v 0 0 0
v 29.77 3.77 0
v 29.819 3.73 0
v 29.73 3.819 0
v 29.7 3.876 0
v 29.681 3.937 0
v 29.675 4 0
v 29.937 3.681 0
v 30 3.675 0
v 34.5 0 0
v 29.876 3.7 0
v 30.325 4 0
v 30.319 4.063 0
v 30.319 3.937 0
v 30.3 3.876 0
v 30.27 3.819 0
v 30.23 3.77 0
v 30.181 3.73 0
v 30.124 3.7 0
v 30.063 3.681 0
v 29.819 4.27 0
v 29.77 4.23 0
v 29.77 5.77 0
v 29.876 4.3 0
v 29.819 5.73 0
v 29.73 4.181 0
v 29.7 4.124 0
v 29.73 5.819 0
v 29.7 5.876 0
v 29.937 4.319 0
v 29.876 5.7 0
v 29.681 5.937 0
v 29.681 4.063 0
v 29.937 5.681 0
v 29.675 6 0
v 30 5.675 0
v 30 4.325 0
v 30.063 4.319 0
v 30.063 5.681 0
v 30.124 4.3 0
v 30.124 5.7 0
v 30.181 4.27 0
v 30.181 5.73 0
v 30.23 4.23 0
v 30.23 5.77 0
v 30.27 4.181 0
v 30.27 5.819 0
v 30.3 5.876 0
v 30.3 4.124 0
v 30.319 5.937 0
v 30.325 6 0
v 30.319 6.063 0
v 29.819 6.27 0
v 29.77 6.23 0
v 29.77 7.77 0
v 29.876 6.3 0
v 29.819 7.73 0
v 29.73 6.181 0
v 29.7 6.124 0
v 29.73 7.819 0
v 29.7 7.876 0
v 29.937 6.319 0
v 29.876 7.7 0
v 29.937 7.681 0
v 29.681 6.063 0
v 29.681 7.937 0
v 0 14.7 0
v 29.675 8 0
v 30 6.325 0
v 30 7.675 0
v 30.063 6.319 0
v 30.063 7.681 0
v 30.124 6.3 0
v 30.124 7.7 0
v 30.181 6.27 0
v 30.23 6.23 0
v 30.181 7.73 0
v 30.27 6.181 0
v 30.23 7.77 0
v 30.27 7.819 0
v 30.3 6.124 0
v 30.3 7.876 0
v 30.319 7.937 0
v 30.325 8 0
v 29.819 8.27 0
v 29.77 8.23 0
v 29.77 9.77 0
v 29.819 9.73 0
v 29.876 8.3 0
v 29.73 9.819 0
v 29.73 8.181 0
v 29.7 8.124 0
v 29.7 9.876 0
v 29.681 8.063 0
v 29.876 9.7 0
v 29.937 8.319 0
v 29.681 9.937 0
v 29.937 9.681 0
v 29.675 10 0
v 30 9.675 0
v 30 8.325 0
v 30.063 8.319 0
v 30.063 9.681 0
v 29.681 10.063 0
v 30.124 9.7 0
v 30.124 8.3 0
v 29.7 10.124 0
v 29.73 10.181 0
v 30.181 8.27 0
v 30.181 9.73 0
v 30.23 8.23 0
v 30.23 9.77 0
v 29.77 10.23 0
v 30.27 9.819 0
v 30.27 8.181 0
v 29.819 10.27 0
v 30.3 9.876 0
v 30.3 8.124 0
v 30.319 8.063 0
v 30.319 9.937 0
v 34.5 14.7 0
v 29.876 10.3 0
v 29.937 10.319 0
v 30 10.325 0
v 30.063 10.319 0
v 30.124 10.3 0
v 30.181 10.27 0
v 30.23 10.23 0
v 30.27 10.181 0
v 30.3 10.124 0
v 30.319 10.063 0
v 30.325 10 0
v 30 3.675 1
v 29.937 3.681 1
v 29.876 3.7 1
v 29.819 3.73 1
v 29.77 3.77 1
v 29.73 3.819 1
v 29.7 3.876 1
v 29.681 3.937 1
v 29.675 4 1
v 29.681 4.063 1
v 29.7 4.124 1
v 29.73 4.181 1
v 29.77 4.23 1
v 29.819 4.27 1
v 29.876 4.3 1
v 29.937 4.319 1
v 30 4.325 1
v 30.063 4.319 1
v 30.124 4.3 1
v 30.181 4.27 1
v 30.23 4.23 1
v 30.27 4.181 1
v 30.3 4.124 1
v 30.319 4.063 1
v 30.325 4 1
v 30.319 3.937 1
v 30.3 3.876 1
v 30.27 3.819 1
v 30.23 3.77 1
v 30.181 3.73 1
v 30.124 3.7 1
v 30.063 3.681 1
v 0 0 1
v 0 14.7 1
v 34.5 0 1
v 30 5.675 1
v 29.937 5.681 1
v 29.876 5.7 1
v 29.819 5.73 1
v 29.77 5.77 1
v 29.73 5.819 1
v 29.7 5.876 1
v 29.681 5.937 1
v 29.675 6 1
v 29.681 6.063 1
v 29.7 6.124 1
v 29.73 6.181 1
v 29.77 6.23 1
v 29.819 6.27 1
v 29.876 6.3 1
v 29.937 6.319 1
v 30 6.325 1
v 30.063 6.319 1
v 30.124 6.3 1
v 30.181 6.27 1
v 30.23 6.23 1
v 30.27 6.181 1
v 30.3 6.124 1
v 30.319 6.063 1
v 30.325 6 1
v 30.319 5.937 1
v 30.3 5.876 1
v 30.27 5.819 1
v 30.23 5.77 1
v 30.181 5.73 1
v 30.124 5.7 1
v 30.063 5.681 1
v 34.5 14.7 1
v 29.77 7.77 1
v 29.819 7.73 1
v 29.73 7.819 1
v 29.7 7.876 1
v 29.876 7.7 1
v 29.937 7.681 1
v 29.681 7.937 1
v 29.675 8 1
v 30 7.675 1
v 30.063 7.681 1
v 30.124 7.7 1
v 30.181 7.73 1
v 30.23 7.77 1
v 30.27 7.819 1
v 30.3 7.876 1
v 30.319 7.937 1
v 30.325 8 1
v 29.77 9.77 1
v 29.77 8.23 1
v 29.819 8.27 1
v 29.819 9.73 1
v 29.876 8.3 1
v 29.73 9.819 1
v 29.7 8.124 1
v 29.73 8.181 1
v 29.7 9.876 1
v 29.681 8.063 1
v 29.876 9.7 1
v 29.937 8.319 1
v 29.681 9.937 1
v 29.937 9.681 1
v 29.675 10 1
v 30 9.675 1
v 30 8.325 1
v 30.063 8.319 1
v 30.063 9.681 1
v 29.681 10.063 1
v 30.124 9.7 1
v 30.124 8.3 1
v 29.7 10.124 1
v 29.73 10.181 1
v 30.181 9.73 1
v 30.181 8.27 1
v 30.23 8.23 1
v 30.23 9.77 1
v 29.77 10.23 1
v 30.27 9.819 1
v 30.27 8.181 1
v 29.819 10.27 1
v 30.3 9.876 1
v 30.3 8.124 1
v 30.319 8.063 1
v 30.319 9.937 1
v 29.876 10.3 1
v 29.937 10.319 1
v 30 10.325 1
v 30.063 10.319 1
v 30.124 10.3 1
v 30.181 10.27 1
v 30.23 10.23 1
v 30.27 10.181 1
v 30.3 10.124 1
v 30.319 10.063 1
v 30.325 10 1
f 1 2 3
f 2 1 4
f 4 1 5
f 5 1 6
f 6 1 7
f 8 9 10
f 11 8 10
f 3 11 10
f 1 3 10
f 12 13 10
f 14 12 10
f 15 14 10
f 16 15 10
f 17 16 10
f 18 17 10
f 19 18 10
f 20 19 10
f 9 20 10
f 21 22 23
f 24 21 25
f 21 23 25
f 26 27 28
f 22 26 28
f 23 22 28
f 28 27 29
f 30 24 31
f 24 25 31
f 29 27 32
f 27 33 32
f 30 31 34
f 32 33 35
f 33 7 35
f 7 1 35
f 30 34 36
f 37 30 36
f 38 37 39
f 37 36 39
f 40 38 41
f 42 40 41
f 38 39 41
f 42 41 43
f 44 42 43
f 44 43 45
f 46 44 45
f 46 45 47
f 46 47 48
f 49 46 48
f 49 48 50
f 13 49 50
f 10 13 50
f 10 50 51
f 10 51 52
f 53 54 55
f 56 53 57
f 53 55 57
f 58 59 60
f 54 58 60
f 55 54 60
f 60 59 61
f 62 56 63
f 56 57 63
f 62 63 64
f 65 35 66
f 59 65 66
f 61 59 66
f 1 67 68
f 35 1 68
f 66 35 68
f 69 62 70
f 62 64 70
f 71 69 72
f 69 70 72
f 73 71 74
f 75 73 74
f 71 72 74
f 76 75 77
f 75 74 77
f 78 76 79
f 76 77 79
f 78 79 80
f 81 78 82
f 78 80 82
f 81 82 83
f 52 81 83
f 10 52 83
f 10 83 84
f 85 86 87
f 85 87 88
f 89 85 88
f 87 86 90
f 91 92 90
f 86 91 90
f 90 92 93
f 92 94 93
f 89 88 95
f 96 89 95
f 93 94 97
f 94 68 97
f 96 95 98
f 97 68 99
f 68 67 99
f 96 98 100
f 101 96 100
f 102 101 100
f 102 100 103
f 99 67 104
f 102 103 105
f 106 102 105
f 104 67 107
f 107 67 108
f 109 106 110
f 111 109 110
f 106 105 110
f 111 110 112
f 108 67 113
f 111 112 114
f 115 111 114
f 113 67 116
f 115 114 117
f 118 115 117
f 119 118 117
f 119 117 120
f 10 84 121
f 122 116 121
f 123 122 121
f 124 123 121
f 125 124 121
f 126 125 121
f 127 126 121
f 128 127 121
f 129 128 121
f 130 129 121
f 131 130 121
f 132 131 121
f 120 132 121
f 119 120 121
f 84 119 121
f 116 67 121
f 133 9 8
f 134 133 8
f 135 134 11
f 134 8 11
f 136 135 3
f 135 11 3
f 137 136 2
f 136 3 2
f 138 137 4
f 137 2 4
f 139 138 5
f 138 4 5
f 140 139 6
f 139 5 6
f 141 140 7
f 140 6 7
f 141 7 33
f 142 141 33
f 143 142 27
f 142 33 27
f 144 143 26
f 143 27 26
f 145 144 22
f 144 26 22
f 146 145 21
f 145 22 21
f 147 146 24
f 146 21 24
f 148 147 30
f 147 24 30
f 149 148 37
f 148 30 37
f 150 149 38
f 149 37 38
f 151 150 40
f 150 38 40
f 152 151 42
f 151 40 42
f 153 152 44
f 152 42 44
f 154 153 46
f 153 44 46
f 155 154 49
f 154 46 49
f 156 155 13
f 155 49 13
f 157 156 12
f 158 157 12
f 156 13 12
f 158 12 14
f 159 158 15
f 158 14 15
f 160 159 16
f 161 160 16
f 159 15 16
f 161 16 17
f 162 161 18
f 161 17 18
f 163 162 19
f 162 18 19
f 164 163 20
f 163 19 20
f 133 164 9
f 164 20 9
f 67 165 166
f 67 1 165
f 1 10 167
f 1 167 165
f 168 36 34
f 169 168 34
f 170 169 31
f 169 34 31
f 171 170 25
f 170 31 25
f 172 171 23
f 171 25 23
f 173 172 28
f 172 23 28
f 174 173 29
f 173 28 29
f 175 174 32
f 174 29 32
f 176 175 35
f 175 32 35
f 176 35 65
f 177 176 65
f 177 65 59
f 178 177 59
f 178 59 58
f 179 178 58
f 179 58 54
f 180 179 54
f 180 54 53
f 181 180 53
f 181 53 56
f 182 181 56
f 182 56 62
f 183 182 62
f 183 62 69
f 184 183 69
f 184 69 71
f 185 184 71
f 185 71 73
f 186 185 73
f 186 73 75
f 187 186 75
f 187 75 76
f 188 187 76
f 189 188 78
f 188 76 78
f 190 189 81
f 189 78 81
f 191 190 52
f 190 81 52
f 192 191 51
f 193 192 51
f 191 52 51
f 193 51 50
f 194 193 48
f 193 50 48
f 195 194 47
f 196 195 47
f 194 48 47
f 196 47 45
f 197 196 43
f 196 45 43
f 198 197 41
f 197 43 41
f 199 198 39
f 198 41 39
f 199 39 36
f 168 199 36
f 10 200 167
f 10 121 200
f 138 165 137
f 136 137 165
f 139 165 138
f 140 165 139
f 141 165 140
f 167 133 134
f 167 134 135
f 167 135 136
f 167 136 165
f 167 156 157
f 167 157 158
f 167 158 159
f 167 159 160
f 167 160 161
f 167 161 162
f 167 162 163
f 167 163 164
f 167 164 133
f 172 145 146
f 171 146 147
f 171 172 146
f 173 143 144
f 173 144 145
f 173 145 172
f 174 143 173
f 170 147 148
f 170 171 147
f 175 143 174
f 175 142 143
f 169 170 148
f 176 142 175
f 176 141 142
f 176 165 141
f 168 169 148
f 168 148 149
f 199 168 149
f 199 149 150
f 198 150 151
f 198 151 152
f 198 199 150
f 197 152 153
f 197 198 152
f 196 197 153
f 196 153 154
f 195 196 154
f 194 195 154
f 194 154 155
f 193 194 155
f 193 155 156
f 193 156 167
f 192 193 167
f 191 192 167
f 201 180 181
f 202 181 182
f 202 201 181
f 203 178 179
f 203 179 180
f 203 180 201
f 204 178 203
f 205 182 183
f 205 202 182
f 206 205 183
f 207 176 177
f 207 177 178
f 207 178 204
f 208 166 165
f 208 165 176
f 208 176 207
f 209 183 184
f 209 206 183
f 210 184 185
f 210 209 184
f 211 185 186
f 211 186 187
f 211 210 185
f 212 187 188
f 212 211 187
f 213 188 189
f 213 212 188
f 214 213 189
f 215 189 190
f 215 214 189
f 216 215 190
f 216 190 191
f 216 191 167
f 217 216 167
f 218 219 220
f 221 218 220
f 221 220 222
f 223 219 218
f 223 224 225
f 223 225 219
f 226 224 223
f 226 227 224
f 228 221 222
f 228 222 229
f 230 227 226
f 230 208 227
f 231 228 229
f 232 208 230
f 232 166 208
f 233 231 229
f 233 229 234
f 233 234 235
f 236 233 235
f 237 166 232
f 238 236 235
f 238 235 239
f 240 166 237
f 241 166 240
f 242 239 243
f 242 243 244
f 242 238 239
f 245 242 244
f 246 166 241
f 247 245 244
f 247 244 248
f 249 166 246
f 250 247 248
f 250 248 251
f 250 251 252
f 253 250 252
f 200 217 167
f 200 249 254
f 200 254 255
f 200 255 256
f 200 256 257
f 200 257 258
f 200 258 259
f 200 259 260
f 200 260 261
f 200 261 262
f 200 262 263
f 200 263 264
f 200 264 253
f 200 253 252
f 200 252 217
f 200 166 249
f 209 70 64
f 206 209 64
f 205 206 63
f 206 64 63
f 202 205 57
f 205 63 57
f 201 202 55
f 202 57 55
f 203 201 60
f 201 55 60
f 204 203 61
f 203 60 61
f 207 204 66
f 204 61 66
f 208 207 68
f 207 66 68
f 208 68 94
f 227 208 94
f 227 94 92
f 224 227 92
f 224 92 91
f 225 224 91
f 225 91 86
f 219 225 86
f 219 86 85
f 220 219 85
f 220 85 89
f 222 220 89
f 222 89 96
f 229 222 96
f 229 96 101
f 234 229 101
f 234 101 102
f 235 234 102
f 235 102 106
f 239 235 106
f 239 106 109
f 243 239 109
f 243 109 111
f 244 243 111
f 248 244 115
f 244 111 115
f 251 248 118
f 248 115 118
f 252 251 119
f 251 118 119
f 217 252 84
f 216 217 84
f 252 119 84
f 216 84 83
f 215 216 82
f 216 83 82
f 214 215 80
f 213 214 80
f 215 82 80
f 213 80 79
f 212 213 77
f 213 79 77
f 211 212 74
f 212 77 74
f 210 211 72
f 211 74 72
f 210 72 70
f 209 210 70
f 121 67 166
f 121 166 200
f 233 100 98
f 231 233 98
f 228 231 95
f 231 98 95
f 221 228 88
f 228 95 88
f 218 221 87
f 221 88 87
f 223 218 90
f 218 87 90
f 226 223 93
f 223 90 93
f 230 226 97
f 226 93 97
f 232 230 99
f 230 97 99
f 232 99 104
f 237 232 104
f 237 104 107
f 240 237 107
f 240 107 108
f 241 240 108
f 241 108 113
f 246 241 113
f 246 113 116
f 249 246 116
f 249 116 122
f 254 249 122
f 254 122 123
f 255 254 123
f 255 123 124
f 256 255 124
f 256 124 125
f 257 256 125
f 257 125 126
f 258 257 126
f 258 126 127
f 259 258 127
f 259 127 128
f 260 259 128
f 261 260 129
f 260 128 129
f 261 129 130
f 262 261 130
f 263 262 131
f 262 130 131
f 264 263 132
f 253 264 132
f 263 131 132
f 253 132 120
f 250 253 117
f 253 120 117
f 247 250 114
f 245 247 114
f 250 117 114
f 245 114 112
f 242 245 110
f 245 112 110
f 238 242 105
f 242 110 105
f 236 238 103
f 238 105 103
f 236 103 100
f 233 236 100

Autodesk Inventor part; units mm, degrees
ref_plane "YZ Plane" through (0, 0, 0) normal (1, 0, 0) x (0, 1, 0)
ref_plane "XZ Plane" through (0, 0, 0) normal (0, 1, 0) x (-1, 0, 0)
ref_plane "XY Plane" through (0, 0, 0) normal (0, 0, 1) x (1, 0, 0)
sketch "Sketch1" plane through (0, 0, 0) normal (0, 0, 1) x (1, 0, 0)
  line L0 (0, 0) -> (0, 14.7)
  line L1 (0, 14.7) -> (34.5, 14.7)
  line L2 (34.5, 14.7) -> (34.5, 0)
  line L3 (34.5, 0) -> (0, 0)
  dimension "d0" = 14.7
  dimension "d1" = 34.5
extrude "Extrusion1" add sketch "Sketch1" along normal blind 1
sketch "Sketch3" plane through (0, 0, 1) normal (0, 0, 1) x (1, 0, 0)
  point P0 (30, 10)
  point P1 (30, 8)
  point P2 (30, 6)
  point P3 (30, 4)
hole "Hole1" at (30, 10, 1) at (30, 8, 1) at (30, 6, 1) at (30, 4, 1) direction (0, 0, -1) diameter 0.65 end through all
properties part number "Zijplaat 4"
